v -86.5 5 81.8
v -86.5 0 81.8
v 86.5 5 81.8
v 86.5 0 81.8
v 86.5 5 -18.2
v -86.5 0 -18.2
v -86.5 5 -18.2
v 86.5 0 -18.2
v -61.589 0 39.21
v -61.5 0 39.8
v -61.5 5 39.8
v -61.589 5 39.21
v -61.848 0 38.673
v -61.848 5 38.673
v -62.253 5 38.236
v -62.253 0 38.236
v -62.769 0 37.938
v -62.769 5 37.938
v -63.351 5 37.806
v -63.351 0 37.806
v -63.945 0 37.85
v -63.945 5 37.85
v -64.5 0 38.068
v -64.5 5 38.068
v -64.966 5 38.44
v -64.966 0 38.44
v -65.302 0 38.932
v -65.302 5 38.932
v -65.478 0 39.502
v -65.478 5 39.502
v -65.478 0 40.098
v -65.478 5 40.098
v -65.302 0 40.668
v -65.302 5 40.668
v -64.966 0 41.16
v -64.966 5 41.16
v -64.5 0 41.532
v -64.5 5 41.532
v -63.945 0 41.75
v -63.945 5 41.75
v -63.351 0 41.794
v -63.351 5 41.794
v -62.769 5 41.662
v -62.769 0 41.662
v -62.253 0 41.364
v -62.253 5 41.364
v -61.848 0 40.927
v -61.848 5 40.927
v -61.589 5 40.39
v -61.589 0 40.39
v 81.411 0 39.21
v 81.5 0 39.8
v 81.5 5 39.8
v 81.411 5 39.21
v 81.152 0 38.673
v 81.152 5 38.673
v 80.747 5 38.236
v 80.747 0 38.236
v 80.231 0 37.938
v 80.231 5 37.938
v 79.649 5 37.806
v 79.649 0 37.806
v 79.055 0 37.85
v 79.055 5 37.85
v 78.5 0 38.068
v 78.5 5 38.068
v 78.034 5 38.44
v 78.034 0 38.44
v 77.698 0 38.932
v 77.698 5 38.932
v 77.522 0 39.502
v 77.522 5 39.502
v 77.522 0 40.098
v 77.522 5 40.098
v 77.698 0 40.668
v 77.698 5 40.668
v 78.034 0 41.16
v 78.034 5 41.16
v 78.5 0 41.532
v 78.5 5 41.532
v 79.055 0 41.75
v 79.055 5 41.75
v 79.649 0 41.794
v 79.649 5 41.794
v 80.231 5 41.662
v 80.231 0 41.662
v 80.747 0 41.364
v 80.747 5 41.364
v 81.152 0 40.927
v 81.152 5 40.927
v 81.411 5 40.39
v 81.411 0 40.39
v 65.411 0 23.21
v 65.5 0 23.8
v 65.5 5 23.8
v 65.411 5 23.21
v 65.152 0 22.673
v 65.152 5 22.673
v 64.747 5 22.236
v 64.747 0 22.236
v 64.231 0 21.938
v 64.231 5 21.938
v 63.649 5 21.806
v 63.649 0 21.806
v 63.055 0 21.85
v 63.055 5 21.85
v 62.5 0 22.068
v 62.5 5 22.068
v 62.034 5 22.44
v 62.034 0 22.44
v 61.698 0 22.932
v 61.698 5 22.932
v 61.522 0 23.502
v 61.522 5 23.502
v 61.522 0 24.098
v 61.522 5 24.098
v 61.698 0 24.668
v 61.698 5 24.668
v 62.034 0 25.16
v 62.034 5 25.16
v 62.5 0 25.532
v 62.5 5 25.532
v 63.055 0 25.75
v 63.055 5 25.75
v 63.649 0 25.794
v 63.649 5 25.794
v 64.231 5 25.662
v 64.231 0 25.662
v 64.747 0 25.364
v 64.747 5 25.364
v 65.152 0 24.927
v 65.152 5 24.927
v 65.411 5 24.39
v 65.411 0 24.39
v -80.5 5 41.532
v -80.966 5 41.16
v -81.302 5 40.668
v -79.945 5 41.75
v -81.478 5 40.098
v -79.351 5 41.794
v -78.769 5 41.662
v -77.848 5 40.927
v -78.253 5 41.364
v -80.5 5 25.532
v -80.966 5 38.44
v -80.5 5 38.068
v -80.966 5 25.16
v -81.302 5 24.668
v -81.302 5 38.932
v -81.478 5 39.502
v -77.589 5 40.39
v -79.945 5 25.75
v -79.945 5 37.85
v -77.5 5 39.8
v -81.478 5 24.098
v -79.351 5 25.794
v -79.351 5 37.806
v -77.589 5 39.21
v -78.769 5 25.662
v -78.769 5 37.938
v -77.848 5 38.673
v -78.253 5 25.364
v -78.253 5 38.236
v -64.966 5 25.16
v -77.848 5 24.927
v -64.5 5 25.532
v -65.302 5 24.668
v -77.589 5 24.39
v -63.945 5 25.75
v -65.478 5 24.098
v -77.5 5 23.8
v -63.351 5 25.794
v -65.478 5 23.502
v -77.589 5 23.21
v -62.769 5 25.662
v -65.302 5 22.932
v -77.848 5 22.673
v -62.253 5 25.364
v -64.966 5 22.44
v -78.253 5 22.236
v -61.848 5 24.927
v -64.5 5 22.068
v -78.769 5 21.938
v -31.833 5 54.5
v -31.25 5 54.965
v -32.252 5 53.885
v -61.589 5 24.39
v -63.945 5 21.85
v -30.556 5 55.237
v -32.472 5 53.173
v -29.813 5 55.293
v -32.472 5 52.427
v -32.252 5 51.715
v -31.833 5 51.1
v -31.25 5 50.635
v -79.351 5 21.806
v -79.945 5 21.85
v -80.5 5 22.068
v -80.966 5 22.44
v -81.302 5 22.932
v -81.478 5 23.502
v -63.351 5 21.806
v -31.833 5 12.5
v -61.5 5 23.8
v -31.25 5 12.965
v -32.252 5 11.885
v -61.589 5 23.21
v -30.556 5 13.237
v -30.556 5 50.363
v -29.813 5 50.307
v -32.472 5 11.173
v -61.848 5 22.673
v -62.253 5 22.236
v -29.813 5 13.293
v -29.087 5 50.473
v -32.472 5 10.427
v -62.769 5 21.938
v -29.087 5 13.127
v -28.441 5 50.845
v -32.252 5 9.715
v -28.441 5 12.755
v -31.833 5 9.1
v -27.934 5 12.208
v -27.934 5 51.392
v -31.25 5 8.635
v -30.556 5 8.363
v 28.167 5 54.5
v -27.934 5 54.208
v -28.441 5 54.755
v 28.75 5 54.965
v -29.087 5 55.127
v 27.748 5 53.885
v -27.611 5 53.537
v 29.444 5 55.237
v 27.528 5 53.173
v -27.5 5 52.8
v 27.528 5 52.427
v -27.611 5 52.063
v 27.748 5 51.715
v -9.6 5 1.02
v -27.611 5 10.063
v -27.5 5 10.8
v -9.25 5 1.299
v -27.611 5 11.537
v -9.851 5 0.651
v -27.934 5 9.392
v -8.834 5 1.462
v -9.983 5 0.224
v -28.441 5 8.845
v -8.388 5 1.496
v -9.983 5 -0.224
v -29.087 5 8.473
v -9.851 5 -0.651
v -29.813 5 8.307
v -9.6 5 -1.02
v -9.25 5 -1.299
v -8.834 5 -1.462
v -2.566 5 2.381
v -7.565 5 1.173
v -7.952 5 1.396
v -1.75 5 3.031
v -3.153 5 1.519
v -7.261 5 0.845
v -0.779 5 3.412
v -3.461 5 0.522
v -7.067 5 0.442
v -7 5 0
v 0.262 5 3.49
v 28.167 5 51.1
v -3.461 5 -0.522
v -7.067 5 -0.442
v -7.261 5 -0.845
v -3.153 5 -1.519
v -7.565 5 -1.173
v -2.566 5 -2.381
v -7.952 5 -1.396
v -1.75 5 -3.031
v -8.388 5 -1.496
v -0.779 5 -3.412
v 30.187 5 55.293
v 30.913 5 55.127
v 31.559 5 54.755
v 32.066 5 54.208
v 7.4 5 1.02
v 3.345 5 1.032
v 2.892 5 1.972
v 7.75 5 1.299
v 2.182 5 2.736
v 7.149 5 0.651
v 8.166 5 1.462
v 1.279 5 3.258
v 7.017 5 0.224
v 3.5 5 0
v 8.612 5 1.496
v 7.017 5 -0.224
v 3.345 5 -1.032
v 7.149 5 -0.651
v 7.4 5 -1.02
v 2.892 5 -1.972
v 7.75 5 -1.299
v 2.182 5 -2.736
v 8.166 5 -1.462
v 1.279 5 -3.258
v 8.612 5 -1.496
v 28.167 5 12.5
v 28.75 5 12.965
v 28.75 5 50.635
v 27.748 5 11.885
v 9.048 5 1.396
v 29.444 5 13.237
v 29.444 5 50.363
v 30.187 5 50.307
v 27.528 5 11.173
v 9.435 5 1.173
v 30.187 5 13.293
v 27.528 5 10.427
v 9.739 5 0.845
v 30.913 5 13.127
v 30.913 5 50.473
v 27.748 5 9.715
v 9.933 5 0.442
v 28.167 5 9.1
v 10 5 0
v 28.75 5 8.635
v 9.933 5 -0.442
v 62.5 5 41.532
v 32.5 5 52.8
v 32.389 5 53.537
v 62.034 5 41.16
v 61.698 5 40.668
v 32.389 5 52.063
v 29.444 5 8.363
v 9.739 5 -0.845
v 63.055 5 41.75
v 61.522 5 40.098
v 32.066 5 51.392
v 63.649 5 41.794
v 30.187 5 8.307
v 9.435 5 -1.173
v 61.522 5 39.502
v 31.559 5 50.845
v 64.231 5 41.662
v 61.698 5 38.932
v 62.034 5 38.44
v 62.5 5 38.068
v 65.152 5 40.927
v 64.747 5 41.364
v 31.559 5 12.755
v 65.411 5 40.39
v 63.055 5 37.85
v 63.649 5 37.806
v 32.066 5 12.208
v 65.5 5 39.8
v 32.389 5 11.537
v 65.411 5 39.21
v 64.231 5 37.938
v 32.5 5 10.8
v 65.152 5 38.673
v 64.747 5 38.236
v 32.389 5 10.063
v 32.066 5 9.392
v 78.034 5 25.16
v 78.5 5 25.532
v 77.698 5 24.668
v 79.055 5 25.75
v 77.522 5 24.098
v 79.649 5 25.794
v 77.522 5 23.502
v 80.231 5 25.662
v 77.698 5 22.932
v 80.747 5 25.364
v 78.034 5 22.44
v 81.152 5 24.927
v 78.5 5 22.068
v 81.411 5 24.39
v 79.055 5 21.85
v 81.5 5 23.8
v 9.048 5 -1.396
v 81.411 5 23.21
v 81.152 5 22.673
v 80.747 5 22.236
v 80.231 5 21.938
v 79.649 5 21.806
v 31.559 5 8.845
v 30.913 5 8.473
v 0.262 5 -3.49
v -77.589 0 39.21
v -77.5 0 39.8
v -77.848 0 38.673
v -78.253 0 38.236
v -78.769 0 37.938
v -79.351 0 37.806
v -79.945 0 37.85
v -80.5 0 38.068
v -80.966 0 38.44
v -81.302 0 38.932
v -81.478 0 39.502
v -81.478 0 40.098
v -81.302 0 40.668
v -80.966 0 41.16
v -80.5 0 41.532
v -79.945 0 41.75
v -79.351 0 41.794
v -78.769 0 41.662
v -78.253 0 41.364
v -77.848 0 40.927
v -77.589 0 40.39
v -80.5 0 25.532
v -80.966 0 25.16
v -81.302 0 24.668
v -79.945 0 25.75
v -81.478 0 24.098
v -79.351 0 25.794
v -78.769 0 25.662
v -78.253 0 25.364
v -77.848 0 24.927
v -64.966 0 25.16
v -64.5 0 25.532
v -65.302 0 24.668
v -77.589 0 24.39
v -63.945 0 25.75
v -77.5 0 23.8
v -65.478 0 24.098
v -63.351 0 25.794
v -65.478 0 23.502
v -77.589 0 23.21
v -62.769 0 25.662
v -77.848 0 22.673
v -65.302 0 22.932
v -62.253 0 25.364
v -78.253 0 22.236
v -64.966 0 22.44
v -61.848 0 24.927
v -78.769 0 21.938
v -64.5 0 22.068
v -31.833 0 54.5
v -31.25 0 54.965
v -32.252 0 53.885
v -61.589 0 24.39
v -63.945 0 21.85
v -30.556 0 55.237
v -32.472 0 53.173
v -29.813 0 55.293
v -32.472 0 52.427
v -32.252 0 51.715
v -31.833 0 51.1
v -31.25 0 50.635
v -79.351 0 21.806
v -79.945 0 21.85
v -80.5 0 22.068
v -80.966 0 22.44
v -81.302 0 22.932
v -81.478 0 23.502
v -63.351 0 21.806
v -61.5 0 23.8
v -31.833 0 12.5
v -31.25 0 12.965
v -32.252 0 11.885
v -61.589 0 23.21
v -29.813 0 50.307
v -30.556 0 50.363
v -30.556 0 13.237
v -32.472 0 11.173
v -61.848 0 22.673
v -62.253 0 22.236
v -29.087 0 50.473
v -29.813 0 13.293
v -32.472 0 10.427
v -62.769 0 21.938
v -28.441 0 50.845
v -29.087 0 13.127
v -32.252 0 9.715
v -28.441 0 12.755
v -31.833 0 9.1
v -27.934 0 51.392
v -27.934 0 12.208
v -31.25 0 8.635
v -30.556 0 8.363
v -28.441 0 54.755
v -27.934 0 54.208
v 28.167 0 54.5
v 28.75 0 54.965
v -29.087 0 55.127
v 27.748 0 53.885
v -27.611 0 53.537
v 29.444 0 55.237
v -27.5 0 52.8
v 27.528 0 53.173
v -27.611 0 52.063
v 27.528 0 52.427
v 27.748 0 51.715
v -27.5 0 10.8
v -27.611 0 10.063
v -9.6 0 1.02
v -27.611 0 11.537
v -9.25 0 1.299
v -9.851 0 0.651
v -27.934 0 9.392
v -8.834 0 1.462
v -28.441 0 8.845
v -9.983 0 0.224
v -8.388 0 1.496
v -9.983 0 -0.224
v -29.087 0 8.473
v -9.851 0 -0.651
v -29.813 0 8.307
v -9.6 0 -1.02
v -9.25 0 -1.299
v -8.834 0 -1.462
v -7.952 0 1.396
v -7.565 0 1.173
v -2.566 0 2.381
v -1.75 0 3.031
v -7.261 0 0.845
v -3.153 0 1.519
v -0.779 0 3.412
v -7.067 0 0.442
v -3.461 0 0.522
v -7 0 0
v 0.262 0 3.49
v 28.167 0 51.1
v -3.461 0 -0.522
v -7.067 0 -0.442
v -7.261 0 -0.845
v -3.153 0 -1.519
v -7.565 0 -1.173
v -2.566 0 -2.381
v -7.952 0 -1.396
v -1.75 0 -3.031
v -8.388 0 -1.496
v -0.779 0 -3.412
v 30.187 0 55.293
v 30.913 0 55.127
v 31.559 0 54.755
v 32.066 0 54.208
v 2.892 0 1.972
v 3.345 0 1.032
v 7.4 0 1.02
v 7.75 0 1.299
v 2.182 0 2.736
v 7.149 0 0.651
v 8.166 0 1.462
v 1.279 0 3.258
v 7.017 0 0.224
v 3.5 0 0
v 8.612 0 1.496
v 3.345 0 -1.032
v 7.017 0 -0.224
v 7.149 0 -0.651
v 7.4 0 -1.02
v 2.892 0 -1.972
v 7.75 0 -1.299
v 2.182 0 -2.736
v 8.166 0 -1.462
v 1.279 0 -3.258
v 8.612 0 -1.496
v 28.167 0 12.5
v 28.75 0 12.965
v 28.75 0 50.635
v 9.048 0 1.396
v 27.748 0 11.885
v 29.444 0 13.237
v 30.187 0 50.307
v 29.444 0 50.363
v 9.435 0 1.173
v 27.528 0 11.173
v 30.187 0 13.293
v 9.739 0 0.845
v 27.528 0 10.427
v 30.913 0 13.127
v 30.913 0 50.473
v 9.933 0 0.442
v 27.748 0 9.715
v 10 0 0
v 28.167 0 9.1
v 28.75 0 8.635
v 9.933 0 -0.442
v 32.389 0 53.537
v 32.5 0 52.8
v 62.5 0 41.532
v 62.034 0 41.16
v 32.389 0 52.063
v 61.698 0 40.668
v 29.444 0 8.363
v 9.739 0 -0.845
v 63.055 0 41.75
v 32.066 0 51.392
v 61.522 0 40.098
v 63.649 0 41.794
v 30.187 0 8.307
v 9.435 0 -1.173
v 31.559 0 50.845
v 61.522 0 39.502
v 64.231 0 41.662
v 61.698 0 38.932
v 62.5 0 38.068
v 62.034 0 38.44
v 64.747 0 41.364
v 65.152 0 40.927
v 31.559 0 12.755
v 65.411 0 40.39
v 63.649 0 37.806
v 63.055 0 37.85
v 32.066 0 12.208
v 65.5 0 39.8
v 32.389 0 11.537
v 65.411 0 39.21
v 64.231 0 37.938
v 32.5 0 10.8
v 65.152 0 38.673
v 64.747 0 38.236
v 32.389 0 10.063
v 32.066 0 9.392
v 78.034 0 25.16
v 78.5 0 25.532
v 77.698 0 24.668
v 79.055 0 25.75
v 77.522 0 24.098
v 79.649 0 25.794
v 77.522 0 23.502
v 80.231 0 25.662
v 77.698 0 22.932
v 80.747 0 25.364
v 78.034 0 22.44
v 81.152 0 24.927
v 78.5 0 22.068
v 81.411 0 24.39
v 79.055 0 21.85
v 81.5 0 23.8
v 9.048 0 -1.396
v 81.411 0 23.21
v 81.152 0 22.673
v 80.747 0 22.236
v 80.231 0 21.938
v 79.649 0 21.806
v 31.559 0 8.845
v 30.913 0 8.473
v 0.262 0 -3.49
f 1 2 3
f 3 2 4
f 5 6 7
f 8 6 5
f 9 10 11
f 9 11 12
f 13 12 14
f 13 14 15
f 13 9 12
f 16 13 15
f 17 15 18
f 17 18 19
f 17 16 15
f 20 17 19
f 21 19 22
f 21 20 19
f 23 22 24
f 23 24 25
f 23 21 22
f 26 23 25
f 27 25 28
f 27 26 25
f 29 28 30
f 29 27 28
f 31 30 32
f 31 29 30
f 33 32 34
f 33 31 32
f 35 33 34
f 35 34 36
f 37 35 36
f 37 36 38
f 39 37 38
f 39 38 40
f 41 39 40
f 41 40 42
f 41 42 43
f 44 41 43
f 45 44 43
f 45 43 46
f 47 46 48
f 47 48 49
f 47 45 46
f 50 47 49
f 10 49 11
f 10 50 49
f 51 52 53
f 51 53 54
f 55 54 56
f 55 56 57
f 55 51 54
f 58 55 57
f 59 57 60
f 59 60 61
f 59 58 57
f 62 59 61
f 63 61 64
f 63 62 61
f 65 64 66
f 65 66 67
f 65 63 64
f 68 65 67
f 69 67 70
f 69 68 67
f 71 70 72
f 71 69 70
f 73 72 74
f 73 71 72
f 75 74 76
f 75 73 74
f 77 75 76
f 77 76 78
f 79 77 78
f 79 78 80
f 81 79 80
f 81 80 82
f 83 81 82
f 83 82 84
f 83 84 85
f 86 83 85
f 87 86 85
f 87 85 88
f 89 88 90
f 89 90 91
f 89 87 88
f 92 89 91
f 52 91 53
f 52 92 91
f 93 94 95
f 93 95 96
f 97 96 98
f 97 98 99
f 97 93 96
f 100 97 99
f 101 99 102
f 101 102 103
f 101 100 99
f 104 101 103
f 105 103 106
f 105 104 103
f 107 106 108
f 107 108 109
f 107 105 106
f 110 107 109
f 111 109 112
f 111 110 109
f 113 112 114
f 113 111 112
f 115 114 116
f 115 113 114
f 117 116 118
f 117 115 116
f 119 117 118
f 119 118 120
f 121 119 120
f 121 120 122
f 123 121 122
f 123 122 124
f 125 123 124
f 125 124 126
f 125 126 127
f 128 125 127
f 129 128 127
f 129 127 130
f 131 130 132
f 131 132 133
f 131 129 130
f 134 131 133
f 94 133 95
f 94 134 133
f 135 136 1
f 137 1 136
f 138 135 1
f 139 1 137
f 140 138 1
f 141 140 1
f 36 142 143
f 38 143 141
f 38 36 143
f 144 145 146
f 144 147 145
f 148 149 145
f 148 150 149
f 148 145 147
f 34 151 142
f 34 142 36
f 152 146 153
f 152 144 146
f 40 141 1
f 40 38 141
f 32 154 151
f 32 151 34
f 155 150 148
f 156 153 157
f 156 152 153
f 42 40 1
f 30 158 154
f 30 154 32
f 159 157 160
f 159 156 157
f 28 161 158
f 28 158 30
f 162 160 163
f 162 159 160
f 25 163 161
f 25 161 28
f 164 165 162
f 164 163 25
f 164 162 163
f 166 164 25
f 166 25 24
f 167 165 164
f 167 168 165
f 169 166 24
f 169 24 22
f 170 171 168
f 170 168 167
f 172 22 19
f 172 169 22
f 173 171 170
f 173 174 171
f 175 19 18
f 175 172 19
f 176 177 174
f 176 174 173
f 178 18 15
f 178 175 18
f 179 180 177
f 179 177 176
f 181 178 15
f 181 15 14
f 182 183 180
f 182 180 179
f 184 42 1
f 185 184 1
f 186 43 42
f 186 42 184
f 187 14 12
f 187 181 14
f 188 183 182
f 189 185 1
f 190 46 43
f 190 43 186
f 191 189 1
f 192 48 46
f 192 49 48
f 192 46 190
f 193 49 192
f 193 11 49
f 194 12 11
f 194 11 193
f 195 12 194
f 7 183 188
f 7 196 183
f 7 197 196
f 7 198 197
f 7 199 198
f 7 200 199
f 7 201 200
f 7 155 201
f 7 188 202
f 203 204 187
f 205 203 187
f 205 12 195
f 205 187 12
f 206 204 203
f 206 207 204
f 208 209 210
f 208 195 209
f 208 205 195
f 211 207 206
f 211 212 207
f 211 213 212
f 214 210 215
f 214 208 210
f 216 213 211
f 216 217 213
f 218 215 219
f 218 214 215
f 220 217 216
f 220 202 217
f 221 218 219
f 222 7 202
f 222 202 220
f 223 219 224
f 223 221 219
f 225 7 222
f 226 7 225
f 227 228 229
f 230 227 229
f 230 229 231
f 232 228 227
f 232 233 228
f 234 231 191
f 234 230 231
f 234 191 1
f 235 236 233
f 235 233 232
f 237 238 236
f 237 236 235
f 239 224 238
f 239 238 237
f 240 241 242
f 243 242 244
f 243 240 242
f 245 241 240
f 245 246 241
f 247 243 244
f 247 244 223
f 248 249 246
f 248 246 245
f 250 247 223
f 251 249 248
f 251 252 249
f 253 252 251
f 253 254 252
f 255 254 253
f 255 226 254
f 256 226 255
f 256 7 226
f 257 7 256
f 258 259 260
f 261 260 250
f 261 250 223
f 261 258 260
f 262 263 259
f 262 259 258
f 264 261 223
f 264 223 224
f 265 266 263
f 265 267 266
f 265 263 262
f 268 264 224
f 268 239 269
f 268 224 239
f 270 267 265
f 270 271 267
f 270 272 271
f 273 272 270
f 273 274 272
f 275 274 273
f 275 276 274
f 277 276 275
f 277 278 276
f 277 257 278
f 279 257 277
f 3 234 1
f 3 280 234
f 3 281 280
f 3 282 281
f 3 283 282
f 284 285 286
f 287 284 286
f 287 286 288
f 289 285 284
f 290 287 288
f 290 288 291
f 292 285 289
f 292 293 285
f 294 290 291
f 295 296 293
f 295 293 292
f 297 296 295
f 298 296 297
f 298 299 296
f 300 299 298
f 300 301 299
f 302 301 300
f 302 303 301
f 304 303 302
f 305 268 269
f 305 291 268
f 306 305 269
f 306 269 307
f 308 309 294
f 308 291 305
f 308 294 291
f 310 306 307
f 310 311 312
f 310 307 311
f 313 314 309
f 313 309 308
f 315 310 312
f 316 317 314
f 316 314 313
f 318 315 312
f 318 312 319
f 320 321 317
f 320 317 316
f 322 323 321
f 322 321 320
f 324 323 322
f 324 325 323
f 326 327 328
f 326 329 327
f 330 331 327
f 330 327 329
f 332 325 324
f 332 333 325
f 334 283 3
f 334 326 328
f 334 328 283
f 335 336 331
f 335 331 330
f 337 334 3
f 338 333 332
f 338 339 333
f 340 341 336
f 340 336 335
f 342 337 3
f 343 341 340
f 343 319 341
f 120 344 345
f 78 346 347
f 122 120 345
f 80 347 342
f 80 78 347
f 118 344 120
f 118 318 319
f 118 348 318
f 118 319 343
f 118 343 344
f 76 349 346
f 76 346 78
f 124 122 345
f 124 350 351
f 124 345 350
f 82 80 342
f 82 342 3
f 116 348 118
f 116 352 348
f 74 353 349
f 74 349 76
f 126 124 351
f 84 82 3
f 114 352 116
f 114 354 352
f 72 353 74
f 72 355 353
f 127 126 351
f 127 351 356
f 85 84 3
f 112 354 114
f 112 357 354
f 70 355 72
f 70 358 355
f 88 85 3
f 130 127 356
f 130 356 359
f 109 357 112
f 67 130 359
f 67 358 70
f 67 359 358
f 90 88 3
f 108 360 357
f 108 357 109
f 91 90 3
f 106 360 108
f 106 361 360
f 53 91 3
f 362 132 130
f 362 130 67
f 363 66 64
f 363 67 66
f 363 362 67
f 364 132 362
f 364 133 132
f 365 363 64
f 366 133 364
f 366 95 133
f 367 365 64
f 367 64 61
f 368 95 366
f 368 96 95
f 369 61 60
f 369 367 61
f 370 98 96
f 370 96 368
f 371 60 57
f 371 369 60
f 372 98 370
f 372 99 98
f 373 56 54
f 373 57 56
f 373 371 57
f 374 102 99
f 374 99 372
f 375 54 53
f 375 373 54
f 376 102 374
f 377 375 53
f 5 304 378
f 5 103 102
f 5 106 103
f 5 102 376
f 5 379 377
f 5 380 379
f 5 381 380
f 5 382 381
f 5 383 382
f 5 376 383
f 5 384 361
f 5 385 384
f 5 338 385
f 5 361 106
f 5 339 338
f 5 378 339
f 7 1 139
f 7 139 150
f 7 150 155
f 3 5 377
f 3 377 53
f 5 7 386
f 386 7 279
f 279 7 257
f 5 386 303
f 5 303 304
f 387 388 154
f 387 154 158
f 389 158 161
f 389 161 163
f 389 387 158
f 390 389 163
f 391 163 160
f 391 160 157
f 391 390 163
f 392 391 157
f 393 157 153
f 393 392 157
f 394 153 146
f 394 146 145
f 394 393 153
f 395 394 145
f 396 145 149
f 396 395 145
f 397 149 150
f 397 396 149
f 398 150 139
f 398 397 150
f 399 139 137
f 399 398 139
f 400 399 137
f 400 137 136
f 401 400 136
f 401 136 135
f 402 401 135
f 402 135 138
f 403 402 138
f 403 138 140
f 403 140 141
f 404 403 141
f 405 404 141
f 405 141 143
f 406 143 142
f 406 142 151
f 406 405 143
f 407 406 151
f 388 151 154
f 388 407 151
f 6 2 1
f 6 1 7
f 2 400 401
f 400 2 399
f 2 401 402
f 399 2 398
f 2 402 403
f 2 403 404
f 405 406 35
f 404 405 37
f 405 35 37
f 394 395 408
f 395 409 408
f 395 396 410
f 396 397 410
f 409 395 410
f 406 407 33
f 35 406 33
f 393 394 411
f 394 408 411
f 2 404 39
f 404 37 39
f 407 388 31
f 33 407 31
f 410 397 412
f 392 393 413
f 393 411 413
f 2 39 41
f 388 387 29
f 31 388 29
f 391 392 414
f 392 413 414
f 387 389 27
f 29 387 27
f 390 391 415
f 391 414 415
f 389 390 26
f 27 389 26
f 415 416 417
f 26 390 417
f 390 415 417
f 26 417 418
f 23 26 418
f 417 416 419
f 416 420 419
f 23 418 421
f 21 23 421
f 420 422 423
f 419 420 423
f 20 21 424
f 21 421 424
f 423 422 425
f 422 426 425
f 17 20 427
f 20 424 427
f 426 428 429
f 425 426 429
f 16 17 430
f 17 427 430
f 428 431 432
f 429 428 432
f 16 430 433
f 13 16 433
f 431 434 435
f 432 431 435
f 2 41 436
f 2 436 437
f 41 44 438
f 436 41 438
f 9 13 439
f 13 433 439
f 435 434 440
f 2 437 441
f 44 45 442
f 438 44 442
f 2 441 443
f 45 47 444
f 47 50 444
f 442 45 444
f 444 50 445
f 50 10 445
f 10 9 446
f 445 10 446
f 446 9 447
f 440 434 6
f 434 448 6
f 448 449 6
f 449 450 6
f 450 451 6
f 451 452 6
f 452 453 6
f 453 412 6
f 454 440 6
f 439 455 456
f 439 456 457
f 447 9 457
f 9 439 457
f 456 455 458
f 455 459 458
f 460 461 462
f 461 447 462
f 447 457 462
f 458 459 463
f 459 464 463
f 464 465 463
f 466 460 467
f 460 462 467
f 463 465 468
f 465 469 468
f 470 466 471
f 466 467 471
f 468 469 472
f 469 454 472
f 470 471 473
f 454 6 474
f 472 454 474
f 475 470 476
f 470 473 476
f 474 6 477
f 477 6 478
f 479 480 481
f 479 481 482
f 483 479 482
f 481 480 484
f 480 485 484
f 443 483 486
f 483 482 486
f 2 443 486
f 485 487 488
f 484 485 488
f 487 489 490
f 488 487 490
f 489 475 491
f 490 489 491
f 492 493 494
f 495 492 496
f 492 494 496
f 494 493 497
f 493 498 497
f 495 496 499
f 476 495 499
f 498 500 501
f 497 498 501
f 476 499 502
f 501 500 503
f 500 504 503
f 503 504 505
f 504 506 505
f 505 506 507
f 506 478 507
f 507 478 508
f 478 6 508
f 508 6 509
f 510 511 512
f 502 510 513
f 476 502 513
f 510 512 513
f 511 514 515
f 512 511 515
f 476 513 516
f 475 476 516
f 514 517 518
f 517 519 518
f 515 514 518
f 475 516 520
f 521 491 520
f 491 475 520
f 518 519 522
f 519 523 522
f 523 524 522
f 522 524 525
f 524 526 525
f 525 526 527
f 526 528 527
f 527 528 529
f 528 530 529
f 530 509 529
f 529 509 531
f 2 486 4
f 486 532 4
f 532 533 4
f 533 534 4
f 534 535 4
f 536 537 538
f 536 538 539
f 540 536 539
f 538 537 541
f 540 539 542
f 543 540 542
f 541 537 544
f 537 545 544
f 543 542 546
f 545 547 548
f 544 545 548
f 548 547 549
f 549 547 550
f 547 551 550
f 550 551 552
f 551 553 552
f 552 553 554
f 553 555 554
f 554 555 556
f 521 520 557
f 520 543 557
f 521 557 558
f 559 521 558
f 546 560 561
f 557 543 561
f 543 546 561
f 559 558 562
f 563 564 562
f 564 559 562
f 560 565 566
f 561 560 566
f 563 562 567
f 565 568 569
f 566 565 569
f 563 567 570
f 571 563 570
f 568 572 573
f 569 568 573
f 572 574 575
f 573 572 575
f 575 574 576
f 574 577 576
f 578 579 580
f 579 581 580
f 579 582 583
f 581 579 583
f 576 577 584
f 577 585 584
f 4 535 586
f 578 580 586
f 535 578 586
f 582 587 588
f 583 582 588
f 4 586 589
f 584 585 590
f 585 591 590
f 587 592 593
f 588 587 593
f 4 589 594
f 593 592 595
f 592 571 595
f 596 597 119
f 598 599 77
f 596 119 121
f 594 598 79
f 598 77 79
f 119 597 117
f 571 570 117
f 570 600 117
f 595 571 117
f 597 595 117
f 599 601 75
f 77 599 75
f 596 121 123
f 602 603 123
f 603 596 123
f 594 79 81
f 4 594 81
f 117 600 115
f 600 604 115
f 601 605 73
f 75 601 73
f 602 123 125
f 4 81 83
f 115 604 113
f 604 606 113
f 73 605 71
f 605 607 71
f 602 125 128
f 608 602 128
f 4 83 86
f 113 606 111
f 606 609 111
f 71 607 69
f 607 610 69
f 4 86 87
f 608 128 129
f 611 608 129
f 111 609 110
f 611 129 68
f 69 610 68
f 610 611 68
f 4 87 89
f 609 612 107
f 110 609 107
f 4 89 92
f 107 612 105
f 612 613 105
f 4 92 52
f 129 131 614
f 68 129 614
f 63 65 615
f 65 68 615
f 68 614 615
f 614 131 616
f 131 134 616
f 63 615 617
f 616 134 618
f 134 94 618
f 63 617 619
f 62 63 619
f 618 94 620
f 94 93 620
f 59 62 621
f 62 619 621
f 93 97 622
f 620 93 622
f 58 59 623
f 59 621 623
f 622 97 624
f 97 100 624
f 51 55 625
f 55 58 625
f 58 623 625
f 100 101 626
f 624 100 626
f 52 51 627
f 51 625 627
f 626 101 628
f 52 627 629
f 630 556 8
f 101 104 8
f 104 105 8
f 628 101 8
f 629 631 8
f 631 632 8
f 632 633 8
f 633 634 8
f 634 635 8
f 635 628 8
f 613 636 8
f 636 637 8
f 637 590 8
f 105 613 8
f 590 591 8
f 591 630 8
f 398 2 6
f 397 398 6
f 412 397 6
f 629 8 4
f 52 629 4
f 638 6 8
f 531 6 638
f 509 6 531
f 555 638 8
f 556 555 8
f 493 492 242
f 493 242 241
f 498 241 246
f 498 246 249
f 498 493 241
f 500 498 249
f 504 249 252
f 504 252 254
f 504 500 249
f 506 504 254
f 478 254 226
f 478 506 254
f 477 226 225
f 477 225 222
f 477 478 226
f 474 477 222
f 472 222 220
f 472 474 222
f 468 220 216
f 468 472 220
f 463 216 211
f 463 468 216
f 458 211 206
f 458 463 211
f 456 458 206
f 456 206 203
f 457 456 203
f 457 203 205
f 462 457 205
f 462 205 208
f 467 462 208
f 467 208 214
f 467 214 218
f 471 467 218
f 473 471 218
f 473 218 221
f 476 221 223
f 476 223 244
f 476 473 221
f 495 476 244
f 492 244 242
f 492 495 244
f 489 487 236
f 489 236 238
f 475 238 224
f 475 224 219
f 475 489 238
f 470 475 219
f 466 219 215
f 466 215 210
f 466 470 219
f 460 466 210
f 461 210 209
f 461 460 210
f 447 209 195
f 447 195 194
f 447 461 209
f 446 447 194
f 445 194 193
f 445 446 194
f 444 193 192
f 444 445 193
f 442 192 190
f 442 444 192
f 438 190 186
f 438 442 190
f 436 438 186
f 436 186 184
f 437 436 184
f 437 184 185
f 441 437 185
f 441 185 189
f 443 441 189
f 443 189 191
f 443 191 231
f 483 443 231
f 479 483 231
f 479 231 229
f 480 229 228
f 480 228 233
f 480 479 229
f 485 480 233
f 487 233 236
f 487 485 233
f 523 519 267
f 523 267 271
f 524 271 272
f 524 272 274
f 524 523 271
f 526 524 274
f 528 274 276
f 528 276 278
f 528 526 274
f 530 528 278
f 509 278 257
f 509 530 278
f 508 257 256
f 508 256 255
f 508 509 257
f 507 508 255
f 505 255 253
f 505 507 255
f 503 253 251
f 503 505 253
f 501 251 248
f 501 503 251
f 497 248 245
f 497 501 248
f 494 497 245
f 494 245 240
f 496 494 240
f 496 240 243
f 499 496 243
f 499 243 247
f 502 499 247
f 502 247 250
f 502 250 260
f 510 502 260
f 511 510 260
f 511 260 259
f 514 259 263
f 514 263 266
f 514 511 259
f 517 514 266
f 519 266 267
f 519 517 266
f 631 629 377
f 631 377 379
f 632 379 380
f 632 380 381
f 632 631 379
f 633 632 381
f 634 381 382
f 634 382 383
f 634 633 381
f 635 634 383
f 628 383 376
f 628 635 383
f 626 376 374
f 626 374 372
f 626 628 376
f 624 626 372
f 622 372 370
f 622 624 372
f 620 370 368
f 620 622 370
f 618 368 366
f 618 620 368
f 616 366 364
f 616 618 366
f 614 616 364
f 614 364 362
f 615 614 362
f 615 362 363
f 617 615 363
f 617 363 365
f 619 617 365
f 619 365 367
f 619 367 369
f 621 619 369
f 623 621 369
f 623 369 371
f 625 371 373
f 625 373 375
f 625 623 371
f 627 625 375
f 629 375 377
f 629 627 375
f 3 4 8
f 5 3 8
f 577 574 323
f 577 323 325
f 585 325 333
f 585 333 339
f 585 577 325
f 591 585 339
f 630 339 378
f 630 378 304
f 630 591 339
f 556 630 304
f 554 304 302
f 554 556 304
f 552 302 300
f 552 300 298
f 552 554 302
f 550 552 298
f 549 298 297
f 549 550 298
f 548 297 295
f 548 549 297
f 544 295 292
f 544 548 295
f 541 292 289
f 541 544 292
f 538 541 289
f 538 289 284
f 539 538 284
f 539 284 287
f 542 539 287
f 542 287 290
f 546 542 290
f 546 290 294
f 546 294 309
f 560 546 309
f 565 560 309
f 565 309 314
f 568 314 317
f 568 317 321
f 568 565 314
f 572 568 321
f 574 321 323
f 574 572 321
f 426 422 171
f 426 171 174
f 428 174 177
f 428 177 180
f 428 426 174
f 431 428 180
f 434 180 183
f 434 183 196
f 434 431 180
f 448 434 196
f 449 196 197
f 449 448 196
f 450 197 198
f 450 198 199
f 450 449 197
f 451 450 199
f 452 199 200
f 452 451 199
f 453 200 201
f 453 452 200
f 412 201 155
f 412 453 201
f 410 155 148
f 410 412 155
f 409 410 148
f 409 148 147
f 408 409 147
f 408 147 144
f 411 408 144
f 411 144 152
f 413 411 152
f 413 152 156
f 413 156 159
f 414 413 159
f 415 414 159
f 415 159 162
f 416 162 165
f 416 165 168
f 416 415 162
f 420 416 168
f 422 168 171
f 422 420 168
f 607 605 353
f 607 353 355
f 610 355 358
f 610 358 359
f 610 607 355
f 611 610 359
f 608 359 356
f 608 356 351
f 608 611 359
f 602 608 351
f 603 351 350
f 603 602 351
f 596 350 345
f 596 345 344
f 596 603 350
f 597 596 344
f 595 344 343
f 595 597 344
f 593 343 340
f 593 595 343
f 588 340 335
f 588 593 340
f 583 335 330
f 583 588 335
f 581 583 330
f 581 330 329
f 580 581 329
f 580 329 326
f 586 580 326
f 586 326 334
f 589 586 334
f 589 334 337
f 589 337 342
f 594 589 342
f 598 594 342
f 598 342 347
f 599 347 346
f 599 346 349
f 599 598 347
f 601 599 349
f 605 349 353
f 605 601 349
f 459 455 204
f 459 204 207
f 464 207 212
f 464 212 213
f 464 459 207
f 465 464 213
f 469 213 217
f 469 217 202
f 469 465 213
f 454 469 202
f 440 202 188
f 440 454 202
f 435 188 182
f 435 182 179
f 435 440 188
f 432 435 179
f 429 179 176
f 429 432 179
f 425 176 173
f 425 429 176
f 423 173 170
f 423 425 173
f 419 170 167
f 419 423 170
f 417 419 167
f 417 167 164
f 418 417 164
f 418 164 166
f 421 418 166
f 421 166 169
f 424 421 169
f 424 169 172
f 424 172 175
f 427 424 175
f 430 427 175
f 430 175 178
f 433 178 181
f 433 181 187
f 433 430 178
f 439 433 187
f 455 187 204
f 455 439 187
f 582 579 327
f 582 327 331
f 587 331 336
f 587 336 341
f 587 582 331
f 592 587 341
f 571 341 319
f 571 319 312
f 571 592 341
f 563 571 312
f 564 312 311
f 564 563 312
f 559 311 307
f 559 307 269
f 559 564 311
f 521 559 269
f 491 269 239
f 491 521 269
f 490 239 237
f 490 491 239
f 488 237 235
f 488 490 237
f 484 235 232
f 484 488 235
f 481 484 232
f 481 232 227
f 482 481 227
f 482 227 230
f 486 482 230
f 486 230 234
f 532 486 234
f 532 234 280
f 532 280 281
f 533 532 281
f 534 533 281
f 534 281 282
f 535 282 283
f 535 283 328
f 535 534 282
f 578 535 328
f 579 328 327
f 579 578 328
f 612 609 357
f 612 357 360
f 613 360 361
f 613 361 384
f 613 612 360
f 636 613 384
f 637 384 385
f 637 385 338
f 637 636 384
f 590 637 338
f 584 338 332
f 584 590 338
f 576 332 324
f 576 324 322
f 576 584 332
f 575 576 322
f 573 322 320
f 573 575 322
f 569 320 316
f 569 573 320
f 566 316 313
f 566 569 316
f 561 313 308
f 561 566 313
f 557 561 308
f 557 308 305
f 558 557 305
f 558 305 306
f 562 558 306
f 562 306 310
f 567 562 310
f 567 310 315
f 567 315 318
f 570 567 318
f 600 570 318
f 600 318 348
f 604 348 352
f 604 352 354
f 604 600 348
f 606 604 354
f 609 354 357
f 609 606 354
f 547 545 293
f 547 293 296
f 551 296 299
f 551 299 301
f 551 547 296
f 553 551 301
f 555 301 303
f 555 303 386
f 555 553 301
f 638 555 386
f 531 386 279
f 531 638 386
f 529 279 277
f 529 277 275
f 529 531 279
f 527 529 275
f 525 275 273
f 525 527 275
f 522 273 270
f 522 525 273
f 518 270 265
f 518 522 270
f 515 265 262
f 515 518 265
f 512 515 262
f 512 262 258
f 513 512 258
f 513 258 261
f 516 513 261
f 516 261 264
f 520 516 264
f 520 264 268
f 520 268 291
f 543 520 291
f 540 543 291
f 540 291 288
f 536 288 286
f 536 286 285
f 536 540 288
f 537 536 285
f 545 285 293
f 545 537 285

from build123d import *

# Parameters (mm, degrees)
SKETCH1_W           = 173
SKETCH1_H           = 100
SKETCH1_R           = 3.5
SKETCH1_R_2         = 1.5
SKETCH1_R_3         = 2.5
SKETCH1_R_4         = 2
BOSS_EXTRUDE1_DEPTH = 5


with BuildPart() as part:
    # Sketch1 → Boss-Extrude1 (new body)
    with BuildSketch(Plane(origin=(0, 0, 0), x_dir=(1, 0, 0), z_dir=(0, 1, 0))):
        with Locations((0, -31.8)):
            Rectangle(SKETCH1_W, SKETCH1_H)
        Circle(SKETCH1_R, mode=Mode.SUBTRACT)
        with Locations((-8.5, 0)):
            Circle(SKETCH1_R_2, mode=Mode.SUBTRACT)
        with Locations((8.5, 0)):
            Circle(SKETCH1_R_2, mode=Mode.SUBTRACT)
        with Locations((-30, -10.8)):
            Circle(SKETCH1_R_3, mode=Mode.SUBTRACT)
        with Locations((-30, -52.8)):
            Circle(SKETCH1_R_3, mode=Mode.SUBTRACT)
        with Locations((30, -52.8)):
            Circle(SKETCH1_R_3, mode=Mode.SUBTRACT)
        with Locations((30, -10.8)):
            Circle(SKETCH1_R_3, mode=Mode.SUBTRACT)
        with Locations((63.5, -23.8)):
            Circle(SKETCH1_R_4, mode=Mode.SUBTRACT)
        with Locations((79.5, -23.8)):
            Circle(SKETCH1_R_4, mode=Mode.SUBTRACT)
        with Locations((79.5, -39.8)):
            Circle(SKETCH1_R_4, mode=Mode.SUBTRACT)
        with Locations((63.5, -39.8)):
            Circle(SKETCH1_R_4, mode=Mode.SUBTRACT)
        with Locations((-63.5, -39.8)):
            Circle(SKETCH1_R_4, mode=Mode.SUBTRACT)
        with Locations((-79.5, -39.8)):
            Circle(SKETCH1_R_4, mode=Mode.SUBTRACT)
        with Locations((-79.5, -23.8)):
            Circle(SKETCH1_R_4, mode=Mode.SUBTRACT)
        with Locations((-63.5, -23.8)):
            Circle(SKETCH1_R_4, mode=Mode.SUBTRACT)
    extrude(amount=BOSS_EXTRUDE1_DEPTH)


solid = part.part
